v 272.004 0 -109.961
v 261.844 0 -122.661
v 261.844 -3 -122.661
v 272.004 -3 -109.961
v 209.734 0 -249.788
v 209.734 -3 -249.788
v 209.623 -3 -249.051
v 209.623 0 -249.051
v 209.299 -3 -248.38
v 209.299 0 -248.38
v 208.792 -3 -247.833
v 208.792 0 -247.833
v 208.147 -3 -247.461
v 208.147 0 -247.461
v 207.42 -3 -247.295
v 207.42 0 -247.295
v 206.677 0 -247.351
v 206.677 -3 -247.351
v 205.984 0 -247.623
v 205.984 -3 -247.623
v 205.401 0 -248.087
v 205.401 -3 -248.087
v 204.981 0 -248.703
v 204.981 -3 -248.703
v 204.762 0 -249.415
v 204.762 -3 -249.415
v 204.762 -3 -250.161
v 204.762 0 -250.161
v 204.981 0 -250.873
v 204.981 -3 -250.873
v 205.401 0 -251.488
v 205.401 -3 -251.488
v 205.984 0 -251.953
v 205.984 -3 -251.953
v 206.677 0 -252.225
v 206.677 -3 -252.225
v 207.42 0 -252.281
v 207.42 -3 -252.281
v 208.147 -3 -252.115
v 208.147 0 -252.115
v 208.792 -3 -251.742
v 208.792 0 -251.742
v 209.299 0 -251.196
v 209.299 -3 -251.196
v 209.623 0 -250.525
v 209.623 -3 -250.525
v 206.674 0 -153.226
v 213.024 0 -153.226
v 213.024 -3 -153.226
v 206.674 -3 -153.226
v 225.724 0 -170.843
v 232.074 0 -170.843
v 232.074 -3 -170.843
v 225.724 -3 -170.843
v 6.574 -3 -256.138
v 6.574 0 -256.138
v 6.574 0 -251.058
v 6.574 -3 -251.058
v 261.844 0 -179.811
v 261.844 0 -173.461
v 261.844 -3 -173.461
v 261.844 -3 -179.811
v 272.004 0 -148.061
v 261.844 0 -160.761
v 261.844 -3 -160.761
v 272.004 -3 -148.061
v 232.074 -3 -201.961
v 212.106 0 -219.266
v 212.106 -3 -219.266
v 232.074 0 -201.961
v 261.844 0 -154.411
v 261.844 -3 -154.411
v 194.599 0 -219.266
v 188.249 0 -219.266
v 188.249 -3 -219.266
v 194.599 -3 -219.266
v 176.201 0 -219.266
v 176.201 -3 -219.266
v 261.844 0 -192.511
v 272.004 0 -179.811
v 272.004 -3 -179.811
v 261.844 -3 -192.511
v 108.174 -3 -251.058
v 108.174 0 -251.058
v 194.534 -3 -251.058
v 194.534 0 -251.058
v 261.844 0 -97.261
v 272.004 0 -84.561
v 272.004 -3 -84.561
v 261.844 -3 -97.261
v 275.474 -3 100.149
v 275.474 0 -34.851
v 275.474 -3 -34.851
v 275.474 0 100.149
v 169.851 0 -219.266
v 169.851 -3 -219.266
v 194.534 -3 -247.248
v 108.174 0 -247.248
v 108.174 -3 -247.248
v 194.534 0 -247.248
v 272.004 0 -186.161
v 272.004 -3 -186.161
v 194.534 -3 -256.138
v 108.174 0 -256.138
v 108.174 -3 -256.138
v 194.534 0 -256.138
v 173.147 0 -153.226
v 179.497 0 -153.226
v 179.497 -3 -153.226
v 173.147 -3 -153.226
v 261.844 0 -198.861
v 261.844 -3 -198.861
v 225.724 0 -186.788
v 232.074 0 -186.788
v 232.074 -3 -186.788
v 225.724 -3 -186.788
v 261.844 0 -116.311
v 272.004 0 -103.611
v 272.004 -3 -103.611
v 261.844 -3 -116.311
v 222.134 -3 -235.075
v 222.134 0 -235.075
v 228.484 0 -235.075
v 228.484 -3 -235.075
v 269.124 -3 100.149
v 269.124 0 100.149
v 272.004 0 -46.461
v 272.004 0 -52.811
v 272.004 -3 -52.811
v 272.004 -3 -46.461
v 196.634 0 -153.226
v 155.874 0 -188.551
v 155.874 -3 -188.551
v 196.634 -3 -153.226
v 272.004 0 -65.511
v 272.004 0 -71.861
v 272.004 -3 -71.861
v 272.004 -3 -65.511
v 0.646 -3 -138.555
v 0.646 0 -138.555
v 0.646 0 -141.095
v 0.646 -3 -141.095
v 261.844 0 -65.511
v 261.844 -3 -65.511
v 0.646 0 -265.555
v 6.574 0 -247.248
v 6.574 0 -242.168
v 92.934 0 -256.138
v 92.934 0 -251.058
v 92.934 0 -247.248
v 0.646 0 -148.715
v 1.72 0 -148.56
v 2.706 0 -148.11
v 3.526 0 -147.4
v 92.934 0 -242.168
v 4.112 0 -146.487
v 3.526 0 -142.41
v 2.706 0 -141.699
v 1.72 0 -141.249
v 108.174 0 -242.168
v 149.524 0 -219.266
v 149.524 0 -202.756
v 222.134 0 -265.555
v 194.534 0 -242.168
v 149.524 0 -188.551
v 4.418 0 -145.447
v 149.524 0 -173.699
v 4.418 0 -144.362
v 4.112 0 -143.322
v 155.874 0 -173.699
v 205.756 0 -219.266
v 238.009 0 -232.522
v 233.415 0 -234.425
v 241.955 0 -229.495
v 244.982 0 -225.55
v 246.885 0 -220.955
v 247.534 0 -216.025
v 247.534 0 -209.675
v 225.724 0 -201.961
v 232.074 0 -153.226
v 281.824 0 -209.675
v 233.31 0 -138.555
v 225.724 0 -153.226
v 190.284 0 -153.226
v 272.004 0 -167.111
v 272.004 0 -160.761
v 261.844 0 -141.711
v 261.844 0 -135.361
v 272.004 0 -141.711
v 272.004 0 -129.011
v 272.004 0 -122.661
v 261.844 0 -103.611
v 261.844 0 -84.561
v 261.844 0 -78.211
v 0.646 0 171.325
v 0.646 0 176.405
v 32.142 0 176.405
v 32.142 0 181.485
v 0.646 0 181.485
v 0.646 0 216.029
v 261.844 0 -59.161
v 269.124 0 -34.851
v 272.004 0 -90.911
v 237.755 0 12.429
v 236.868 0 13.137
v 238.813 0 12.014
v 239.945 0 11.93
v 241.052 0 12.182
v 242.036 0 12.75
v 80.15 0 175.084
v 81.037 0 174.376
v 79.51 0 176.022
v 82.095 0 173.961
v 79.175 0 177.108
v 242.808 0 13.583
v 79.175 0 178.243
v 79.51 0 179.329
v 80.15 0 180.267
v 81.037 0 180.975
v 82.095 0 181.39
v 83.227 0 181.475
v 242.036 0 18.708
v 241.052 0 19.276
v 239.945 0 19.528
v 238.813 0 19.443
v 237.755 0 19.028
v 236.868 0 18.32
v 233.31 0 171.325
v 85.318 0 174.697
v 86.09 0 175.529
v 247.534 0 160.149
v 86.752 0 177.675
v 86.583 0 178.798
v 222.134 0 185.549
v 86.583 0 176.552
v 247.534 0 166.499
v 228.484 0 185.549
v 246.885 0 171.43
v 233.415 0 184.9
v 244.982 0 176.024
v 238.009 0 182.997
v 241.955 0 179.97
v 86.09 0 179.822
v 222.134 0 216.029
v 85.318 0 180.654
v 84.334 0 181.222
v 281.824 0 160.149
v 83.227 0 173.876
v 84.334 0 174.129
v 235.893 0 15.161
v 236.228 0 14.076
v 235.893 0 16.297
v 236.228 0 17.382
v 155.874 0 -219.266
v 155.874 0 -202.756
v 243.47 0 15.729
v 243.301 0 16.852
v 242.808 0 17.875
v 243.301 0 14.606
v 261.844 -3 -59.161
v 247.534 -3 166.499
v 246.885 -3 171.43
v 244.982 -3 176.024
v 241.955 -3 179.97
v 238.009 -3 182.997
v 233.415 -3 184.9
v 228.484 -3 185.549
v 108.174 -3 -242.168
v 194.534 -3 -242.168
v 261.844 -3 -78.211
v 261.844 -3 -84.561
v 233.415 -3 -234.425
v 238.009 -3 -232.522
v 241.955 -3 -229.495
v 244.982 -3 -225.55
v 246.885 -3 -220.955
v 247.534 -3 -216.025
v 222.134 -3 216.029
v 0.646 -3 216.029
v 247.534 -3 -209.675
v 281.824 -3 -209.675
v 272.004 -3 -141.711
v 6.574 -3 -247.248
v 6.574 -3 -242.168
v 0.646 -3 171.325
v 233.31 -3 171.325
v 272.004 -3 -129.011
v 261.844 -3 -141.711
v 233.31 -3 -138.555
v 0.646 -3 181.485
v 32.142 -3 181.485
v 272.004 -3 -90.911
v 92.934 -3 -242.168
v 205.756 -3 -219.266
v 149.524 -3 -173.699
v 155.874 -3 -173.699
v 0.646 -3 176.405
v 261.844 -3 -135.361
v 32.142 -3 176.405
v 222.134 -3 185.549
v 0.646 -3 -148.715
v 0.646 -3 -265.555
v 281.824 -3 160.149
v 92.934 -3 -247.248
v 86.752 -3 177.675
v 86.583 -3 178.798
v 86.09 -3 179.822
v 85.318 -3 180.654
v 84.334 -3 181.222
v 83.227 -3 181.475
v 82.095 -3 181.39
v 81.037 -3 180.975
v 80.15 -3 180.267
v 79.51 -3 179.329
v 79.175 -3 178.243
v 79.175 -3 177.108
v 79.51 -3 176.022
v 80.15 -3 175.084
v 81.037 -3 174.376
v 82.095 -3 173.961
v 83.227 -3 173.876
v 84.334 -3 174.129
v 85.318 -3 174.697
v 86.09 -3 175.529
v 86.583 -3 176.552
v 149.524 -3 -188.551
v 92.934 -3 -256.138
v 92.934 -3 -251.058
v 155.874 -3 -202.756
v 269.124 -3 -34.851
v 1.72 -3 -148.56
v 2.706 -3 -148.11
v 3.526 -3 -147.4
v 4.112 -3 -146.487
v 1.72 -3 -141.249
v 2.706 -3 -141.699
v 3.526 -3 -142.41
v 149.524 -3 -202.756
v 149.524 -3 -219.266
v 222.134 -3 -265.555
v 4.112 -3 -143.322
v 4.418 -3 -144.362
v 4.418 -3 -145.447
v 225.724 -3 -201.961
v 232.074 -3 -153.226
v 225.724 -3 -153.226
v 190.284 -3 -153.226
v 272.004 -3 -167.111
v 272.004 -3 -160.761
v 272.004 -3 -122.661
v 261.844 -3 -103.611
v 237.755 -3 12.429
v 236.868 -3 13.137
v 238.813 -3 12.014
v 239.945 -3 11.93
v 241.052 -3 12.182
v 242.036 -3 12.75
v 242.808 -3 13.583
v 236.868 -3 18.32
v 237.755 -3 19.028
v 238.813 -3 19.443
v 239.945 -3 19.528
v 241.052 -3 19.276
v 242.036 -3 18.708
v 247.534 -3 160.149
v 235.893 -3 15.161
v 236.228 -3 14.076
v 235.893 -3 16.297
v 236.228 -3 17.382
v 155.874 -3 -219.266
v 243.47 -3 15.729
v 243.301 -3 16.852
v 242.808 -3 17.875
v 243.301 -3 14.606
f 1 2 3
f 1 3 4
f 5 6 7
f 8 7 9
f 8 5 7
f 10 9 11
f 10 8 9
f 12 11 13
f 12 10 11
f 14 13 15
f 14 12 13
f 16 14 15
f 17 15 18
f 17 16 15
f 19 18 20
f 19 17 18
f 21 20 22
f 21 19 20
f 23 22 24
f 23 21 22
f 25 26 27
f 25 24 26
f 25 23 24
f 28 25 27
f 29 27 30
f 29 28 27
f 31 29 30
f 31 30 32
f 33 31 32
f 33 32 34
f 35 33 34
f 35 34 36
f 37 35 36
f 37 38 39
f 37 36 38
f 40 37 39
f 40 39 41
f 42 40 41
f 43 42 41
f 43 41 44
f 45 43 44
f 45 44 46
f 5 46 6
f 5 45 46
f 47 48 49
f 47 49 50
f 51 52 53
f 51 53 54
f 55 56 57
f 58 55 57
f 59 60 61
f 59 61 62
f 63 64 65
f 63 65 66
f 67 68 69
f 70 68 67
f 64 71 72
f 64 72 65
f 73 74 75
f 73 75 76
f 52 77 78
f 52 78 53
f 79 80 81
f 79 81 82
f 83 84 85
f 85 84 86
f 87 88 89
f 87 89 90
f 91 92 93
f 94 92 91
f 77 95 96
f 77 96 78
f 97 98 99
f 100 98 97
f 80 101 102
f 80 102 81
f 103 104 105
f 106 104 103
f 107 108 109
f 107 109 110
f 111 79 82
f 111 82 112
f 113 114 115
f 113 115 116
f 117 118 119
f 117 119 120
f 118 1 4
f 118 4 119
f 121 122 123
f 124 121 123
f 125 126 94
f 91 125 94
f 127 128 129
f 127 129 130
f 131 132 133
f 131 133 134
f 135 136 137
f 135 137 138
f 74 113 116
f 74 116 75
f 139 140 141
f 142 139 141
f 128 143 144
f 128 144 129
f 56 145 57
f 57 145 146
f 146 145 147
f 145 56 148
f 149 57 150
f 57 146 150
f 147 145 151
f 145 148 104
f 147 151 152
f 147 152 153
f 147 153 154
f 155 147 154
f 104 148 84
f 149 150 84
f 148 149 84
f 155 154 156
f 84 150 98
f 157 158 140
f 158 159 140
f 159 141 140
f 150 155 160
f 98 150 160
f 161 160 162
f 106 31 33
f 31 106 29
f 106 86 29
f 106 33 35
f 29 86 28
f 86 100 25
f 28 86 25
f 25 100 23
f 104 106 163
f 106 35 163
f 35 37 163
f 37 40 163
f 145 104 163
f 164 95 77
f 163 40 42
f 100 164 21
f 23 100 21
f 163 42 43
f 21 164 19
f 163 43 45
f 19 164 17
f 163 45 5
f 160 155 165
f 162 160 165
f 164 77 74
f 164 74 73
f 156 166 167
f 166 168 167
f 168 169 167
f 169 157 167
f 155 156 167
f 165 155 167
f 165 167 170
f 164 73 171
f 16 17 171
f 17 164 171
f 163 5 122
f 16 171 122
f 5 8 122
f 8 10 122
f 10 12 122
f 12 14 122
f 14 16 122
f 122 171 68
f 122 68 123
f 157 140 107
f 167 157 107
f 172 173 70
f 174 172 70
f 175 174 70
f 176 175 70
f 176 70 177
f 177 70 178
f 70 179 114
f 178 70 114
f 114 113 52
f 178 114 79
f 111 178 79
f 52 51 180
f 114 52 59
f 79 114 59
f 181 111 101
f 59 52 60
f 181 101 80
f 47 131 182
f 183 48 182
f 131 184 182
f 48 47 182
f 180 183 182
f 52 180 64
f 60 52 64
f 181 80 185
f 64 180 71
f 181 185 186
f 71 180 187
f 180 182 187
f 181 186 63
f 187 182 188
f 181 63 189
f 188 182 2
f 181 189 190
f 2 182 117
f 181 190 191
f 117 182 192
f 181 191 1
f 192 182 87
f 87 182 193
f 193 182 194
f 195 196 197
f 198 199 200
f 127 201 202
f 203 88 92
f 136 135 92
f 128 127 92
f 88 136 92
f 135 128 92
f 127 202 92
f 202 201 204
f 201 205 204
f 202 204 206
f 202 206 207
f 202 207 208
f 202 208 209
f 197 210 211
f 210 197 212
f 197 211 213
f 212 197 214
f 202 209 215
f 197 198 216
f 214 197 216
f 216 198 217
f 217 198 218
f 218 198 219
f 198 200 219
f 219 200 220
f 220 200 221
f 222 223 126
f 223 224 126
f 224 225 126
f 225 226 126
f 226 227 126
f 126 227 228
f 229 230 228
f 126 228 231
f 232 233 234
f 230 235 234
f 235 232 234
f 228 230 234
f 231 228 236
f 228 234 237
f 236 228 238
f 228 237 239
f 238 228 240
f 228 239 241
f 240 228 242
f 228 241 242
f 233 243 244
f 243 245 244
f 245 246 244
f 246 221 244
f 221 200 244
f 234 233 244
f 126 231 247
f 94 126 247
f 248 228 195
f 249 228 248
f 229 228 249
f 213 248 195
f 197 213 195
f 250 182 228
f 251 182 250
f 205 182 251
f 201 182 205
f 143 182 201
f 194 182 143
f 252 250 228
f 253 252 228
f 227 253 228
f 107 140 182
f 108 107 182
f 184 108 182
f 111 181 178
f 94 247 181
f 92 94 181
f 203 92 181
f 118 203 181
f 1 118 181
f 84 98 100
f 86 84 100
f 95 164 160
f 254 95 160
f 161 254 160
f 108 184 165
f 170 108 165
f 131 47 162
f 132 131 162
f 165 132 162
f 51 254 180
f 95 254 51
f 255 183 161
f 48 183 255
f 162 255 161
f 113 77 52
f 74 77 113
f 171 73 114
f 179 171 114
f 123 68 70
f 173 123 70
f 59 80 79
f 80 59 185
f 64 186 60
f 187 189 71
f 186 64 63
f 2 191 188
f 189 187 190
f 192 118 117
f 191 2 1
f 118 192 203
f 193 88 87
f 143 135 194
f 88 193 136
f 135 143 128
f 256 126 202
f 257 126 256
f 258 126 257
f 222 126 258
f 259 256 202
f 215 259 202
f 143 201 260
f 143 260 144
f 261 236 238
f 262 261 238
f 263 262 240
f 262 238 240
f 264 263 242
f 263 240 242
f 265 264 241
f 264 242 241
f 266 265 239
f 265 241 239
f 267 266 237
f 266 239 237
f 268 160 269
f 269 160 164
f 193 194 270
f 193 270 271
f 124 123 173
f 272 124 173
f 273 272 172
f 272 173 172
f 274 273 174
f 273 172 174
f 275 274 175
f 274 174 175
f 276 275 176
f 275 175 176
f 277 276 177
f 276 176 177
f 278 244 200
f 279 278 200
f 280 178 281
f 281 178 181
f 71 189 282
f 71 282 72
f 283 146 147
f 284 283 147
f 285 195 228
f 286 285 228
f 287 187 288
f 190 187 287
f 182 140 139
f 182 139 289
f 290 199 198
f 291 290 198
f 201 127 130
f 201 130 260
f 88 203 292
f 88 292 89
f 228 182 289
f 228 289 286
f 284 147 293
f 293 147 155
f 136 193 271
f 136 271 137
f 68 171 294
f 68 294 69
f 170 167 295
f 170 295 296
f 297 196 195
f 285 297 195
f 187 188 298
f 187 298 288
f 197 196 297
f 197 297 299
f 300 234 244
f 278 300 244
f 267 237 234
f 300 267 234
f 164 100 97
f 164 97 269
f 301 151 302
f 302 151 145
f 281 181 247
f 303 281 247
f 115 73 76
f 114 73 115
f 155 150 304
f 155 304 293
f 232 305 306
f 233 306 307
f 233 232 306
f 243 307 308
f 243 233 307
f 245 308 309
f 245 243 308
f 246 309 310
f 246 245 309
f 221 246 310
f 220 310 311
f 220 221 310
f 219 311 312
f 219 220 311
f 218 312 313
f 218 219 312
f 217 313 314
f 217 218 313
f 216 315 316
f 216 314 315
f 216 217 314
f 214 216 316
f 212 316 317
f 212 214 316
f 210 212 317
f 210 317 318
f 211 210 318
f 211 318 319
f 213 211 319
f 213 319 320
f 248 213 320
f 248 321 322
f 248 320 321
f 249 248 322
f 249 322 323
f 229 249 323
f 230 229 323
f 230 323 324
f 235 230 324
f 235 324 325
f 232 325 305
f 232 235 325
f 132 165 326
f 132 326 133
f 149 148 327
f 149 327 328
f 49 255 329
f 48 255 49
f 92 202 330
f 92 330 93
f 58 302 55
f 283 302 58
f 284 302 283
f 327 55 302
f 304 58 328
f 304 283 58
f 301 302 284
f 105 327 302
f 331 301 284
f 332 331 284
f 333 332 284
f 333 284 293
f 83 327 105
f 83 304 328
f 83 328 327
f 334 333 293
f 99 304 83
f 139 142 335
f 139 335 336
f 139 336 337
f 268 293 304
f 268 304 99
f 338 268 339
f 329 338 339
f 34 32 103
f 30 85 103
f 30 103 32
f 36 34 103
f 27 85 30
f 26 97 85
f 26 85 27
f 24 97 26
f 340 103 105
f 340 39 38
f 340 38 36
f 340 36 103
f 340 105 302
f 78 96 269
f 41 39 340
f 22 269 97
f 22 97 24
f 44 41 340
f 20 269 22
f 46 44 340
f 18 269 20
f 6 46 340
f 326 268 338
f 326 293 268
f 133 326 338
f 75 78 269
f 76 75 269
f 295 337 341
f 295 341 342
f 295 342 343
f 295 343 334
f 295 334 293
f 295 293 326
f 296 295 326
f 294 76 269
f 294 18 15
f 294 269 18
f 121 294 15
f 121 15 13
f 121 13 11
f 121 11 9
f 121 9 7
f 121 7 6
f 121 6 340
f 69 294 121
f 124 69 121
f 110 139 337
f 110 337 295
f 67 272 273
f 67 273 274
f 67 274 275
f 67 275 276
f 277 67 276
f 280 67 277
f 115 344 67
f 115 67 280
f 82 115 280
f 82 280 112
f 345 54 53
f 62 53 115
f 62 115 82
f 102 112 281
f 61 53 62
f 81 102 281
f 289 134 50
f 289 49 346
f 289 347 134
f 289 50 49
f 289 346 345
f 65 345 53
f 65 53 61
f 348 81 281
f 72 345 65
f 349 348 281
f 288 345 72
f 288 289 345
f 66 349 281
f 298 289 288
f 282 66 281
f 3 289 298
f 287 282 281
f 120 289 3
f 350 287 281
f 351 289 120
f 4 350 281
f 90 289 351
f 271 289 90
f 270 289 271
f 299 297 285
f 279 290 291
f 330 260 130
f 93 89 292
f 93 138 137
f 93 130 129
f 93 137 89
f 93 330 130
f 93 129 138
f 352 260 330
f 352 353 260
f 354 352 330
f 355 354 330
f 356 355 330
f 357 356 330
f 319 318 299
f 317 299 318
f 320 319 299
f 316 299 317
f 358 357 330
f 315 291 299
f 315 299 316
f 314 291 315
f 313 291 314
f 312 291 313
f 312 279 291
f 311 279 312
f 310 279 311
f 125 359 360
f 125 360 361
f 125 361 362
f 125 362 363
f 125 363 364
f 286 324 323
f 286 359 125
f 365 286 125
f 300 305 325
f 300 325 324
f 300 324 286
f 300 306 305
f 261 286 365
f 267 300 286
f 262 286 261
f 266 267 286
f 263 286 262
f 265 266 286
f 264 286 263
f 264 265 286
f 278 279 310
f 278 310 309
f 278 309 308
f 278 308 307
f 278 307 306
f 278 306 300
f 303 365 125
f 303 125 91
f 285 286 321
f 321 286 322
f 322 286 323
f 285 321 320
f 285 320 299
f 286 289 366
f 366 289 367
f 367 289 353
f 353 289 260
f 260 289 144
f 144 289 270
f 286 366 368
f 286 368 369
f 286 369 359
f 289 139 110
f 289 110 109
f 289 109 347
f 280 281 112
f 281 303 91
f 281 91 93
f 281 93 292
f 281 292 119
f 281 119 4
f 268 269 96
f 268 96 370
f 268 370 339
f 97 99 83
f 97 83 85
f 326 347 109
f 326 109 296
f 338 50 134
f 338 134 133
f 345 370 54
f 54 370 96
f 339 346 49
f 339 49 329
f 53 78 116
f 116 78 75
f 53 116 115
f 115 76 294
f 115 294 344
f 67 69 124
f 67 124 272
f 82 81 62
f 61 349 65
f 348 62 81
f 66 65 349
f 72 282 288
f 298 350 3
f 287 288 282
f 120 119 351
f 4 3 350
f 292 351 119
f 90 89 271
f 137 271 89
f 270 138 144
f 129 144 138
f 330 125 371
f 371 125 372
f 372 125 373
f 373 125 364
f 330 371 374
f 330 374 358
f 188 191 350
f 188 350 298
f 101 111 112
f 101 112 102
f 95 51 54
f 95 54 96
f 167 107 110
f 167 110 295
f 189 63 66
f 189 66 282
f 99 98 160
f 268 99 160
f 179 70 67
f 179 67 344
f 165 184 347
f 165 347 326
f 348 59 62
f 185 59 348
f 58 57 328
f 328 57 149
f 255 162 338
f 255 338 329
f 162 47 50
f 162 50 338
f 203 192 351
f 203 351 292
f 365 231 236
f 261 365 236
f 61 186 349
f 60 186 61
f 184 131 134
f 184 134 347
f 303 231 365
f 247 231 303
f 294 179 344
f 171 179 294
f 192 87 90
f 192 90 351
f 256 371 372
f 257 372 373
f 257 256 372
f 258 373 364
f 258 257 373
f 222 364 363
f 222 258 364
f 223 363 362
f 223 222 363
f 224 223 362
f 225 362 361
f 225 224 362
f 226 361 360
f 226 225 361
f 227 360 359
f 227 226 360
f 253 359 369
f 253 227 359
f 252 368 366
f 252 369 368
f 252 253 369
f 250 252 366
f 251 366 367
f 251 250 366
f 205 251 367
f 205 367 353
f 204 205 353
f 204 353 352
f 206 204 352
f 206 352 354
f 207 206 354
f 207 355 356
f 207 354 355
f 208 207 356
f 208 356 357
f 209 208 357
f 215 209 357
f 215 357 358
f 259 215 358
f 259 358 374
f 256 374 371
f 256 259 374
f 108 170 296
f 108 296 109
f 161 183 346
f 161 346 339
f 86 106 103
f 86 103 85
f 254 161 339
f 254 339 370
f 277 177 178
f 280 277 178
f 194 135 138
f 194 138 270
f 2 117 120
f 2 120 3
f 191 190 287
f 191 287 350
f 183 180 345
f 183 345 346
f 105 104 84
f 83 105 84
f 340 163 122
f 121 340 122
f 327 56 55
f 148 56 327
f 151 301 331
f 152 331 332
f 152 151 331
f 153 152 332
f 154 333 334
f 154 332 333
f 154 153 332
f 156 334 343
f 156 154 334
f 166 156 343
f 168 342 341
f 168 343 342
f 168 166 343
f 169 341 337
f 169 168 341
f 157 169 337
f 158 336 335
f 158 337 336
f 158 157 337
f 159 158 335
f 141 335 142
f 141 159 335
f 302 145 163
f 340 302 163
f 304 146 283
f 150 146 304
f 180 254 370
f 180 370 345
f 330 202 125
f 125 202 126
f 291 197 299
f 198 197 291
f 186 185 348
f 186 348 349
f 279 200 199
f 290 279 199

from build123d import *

# Parameters (mm, degrees)
F0_W     = 221.488
F0_H     = 30.48
F0_W_2   = 34.29
F0_H_2   = 369.824
F1_DEPTH = 3
F2_W     = 86.36
F2_H     = 5.08
F2_R     = 2.5
F2_W_2   = 273.93447
F2_H_2   = 309.88
F2_W_3   = 6.35
F2_H_3   = 135
F2_R_2   = 3.81
F2_W_4   = 40.901455
F3_DEPTH = 25.4
F5_DEPTH = 25.4


with BuildPart() as f1:
    # F0 (on Front) → F1 (new body)
    with BuildSketch(Plane.XZ):
        Polygon((222.134481, 216.029425), (0.646481, 216.029425), (0.646481, 185.549425), (203.084481, 185.549425), (222.134481, 185.549425), align=None)
        with BuildLine():
            Line((203.084481, 185.549425), (0.646481, 185.549425))
            Line((0.646481, 185.549425), (0.646481, -235.074575))
            Line((0.646481, -235.074575), (222.134481, -235.074575))
            Line((222.134481, -235.074575), (228.484481, -235.074575))
            ThreePointArc((228.484481, -235.074575), (241.954865, -229.49496), (247.534481, -216.024575))
            Line((247.534481, -216.024575), (247.534481, -209.674575))
            Line((247.534481, -209.674575), (247.534481, 160.149425))
            Line((247.534481, 160.149425), (247.534481, 166.499425))
            ThreePointArc((247.534481, 166.499425), (241.954865, 179.969809), (228.484481, 185.549425))
            Line((228.484481, 185.549425), (222.134481, 185.549425))
            Line((222.134481, 185.549425), (203.084481, 185.549425))
        make_face()
        with Locations((111.390481, -250.314575)):
            Rectangle(F0_W, F0_H)
        with Locations((264.679481, -24.762575)):
            Rectangle(F0_W_2, F0_H_2)
    extrude(amount=F1_DEPTH)

    # F2 (on Front) → F3 (cut)
    with BuildSketch(Plane.XZ):
        Polygon((272.003669, -103.610899), (261.843669, -116.310899), (261.843669, -122.660899), (272.003669, -109.960899), align=None)
        Polygon((272.003669, -122.660899), (261.843669, -135.360899), (261.843669, -141.710899), (272.003669, -129.010899), align=None)
        Polygon((261.843669, -103.610899), (272.003669, -90.910899), (272.003669, -84.560899), (261.843669, -97.260899), align=None)
        Polygon((261.843669, -78.210899), (261.843669, -84.560899), (272.003669, -71.860899), (272.003669, -65.510899), align=None)
        Polygon((261.843669, -154.410899), (261.843669, -160.760899), (272.003669, -148.060899), (272.003669, -141.710899), align=None)
        Polygon((272.003669, -46.460899), (261.843669, -59.160899), (261.843669, -65.510899), (272.003669, -52.810899), align=None)
        Polygon((272.003669, -167.110899), (272.003669, -160.760899), (261.843669, -173.460899), (261.843669, -179.810899), align=None)
        Polygon((272.003669, -186.160899), (272.003669, -179.810899), (261.843669, -192.510899), (261.843669, -198.860899), align=None)
        with Locations((49.753669, -244.707899)):
            Rectangle(F2_W, F2_H)
        with Locations((49.753669, -253.597899)):
            Rectangle(F2_W, F2_H)
        with Locations((151.353669, -253.597899)):
            Rectangle(F2_W, F2_H)
        with Locations((151.353669, -244.707899)):
            Rectangle(F2_W, F2_H)
        with Locations((207.233669, -249.787899)):
            Circle(F2_R)
        with Locations((96.343246, 16.385425)):
            Rectangle(F2_W_2, F2_H_2)
        with Locations((272.299481, 32.649425)):
            Rectangle(F2_W_3, F2_H_3)
        with Locations((82.942481, 177.675425)):
            Circle(F2_R_2)
        with Locations((11.691753, 178.945425)):
            Rectangle(F2_W_4, F2_H)
        with Locations((239.660481, 15.728911)):
            Circle(F2_R_2)
        with Locations((0.646481, -144.904575)):
            Circle(F2_R_2)
    extrude(amount=F3_DEPTH, mode=Mode.SUBTRACT)

    # F4 (on Front) → F5 (cut)
    with BuildSketch(Plane.XZ):
        Polygon((155.873724, -202.75587), (213.023724, -153.22587), (206.673724, -153.22587), (149.523724, -202.75587), align=None)
        Polygon((155.873724, -219.26587), (232.073724, -153.22587), (225.723724, -153.22587), (149.523724, -219.26587), align=None)
        Polygon((155.873724, -188.551126), (196.633635, -153.22587), (190.283635, -153.22587), (149.523724, -188.551126), align=None)
        Polygon((173.147047, -153.22587), (149.523724, -173.699416), (155.873724, -173.699416), (179.497047, -153.22587), align=None)
        Polygon((194.59876, -219.26587), (232.073724, -186.787567), (225.723724, -186.787567), (188.24876, -219.26587), align=None)
        Polygon((225.723724, -170.842871), (169.851033, -219.26587), (176.201033, -219.26587), (232.073724, -170.842871), align=None)
        Polygon((225.723724, -201.960742), (205.756269, -219.26587), (212.106269, -219.26587), (232.073724, -201.960742), align=None)
    extrude(amount=F5_DEPTH, mode=Mode.SUBTRACT)


solid = f1.part
